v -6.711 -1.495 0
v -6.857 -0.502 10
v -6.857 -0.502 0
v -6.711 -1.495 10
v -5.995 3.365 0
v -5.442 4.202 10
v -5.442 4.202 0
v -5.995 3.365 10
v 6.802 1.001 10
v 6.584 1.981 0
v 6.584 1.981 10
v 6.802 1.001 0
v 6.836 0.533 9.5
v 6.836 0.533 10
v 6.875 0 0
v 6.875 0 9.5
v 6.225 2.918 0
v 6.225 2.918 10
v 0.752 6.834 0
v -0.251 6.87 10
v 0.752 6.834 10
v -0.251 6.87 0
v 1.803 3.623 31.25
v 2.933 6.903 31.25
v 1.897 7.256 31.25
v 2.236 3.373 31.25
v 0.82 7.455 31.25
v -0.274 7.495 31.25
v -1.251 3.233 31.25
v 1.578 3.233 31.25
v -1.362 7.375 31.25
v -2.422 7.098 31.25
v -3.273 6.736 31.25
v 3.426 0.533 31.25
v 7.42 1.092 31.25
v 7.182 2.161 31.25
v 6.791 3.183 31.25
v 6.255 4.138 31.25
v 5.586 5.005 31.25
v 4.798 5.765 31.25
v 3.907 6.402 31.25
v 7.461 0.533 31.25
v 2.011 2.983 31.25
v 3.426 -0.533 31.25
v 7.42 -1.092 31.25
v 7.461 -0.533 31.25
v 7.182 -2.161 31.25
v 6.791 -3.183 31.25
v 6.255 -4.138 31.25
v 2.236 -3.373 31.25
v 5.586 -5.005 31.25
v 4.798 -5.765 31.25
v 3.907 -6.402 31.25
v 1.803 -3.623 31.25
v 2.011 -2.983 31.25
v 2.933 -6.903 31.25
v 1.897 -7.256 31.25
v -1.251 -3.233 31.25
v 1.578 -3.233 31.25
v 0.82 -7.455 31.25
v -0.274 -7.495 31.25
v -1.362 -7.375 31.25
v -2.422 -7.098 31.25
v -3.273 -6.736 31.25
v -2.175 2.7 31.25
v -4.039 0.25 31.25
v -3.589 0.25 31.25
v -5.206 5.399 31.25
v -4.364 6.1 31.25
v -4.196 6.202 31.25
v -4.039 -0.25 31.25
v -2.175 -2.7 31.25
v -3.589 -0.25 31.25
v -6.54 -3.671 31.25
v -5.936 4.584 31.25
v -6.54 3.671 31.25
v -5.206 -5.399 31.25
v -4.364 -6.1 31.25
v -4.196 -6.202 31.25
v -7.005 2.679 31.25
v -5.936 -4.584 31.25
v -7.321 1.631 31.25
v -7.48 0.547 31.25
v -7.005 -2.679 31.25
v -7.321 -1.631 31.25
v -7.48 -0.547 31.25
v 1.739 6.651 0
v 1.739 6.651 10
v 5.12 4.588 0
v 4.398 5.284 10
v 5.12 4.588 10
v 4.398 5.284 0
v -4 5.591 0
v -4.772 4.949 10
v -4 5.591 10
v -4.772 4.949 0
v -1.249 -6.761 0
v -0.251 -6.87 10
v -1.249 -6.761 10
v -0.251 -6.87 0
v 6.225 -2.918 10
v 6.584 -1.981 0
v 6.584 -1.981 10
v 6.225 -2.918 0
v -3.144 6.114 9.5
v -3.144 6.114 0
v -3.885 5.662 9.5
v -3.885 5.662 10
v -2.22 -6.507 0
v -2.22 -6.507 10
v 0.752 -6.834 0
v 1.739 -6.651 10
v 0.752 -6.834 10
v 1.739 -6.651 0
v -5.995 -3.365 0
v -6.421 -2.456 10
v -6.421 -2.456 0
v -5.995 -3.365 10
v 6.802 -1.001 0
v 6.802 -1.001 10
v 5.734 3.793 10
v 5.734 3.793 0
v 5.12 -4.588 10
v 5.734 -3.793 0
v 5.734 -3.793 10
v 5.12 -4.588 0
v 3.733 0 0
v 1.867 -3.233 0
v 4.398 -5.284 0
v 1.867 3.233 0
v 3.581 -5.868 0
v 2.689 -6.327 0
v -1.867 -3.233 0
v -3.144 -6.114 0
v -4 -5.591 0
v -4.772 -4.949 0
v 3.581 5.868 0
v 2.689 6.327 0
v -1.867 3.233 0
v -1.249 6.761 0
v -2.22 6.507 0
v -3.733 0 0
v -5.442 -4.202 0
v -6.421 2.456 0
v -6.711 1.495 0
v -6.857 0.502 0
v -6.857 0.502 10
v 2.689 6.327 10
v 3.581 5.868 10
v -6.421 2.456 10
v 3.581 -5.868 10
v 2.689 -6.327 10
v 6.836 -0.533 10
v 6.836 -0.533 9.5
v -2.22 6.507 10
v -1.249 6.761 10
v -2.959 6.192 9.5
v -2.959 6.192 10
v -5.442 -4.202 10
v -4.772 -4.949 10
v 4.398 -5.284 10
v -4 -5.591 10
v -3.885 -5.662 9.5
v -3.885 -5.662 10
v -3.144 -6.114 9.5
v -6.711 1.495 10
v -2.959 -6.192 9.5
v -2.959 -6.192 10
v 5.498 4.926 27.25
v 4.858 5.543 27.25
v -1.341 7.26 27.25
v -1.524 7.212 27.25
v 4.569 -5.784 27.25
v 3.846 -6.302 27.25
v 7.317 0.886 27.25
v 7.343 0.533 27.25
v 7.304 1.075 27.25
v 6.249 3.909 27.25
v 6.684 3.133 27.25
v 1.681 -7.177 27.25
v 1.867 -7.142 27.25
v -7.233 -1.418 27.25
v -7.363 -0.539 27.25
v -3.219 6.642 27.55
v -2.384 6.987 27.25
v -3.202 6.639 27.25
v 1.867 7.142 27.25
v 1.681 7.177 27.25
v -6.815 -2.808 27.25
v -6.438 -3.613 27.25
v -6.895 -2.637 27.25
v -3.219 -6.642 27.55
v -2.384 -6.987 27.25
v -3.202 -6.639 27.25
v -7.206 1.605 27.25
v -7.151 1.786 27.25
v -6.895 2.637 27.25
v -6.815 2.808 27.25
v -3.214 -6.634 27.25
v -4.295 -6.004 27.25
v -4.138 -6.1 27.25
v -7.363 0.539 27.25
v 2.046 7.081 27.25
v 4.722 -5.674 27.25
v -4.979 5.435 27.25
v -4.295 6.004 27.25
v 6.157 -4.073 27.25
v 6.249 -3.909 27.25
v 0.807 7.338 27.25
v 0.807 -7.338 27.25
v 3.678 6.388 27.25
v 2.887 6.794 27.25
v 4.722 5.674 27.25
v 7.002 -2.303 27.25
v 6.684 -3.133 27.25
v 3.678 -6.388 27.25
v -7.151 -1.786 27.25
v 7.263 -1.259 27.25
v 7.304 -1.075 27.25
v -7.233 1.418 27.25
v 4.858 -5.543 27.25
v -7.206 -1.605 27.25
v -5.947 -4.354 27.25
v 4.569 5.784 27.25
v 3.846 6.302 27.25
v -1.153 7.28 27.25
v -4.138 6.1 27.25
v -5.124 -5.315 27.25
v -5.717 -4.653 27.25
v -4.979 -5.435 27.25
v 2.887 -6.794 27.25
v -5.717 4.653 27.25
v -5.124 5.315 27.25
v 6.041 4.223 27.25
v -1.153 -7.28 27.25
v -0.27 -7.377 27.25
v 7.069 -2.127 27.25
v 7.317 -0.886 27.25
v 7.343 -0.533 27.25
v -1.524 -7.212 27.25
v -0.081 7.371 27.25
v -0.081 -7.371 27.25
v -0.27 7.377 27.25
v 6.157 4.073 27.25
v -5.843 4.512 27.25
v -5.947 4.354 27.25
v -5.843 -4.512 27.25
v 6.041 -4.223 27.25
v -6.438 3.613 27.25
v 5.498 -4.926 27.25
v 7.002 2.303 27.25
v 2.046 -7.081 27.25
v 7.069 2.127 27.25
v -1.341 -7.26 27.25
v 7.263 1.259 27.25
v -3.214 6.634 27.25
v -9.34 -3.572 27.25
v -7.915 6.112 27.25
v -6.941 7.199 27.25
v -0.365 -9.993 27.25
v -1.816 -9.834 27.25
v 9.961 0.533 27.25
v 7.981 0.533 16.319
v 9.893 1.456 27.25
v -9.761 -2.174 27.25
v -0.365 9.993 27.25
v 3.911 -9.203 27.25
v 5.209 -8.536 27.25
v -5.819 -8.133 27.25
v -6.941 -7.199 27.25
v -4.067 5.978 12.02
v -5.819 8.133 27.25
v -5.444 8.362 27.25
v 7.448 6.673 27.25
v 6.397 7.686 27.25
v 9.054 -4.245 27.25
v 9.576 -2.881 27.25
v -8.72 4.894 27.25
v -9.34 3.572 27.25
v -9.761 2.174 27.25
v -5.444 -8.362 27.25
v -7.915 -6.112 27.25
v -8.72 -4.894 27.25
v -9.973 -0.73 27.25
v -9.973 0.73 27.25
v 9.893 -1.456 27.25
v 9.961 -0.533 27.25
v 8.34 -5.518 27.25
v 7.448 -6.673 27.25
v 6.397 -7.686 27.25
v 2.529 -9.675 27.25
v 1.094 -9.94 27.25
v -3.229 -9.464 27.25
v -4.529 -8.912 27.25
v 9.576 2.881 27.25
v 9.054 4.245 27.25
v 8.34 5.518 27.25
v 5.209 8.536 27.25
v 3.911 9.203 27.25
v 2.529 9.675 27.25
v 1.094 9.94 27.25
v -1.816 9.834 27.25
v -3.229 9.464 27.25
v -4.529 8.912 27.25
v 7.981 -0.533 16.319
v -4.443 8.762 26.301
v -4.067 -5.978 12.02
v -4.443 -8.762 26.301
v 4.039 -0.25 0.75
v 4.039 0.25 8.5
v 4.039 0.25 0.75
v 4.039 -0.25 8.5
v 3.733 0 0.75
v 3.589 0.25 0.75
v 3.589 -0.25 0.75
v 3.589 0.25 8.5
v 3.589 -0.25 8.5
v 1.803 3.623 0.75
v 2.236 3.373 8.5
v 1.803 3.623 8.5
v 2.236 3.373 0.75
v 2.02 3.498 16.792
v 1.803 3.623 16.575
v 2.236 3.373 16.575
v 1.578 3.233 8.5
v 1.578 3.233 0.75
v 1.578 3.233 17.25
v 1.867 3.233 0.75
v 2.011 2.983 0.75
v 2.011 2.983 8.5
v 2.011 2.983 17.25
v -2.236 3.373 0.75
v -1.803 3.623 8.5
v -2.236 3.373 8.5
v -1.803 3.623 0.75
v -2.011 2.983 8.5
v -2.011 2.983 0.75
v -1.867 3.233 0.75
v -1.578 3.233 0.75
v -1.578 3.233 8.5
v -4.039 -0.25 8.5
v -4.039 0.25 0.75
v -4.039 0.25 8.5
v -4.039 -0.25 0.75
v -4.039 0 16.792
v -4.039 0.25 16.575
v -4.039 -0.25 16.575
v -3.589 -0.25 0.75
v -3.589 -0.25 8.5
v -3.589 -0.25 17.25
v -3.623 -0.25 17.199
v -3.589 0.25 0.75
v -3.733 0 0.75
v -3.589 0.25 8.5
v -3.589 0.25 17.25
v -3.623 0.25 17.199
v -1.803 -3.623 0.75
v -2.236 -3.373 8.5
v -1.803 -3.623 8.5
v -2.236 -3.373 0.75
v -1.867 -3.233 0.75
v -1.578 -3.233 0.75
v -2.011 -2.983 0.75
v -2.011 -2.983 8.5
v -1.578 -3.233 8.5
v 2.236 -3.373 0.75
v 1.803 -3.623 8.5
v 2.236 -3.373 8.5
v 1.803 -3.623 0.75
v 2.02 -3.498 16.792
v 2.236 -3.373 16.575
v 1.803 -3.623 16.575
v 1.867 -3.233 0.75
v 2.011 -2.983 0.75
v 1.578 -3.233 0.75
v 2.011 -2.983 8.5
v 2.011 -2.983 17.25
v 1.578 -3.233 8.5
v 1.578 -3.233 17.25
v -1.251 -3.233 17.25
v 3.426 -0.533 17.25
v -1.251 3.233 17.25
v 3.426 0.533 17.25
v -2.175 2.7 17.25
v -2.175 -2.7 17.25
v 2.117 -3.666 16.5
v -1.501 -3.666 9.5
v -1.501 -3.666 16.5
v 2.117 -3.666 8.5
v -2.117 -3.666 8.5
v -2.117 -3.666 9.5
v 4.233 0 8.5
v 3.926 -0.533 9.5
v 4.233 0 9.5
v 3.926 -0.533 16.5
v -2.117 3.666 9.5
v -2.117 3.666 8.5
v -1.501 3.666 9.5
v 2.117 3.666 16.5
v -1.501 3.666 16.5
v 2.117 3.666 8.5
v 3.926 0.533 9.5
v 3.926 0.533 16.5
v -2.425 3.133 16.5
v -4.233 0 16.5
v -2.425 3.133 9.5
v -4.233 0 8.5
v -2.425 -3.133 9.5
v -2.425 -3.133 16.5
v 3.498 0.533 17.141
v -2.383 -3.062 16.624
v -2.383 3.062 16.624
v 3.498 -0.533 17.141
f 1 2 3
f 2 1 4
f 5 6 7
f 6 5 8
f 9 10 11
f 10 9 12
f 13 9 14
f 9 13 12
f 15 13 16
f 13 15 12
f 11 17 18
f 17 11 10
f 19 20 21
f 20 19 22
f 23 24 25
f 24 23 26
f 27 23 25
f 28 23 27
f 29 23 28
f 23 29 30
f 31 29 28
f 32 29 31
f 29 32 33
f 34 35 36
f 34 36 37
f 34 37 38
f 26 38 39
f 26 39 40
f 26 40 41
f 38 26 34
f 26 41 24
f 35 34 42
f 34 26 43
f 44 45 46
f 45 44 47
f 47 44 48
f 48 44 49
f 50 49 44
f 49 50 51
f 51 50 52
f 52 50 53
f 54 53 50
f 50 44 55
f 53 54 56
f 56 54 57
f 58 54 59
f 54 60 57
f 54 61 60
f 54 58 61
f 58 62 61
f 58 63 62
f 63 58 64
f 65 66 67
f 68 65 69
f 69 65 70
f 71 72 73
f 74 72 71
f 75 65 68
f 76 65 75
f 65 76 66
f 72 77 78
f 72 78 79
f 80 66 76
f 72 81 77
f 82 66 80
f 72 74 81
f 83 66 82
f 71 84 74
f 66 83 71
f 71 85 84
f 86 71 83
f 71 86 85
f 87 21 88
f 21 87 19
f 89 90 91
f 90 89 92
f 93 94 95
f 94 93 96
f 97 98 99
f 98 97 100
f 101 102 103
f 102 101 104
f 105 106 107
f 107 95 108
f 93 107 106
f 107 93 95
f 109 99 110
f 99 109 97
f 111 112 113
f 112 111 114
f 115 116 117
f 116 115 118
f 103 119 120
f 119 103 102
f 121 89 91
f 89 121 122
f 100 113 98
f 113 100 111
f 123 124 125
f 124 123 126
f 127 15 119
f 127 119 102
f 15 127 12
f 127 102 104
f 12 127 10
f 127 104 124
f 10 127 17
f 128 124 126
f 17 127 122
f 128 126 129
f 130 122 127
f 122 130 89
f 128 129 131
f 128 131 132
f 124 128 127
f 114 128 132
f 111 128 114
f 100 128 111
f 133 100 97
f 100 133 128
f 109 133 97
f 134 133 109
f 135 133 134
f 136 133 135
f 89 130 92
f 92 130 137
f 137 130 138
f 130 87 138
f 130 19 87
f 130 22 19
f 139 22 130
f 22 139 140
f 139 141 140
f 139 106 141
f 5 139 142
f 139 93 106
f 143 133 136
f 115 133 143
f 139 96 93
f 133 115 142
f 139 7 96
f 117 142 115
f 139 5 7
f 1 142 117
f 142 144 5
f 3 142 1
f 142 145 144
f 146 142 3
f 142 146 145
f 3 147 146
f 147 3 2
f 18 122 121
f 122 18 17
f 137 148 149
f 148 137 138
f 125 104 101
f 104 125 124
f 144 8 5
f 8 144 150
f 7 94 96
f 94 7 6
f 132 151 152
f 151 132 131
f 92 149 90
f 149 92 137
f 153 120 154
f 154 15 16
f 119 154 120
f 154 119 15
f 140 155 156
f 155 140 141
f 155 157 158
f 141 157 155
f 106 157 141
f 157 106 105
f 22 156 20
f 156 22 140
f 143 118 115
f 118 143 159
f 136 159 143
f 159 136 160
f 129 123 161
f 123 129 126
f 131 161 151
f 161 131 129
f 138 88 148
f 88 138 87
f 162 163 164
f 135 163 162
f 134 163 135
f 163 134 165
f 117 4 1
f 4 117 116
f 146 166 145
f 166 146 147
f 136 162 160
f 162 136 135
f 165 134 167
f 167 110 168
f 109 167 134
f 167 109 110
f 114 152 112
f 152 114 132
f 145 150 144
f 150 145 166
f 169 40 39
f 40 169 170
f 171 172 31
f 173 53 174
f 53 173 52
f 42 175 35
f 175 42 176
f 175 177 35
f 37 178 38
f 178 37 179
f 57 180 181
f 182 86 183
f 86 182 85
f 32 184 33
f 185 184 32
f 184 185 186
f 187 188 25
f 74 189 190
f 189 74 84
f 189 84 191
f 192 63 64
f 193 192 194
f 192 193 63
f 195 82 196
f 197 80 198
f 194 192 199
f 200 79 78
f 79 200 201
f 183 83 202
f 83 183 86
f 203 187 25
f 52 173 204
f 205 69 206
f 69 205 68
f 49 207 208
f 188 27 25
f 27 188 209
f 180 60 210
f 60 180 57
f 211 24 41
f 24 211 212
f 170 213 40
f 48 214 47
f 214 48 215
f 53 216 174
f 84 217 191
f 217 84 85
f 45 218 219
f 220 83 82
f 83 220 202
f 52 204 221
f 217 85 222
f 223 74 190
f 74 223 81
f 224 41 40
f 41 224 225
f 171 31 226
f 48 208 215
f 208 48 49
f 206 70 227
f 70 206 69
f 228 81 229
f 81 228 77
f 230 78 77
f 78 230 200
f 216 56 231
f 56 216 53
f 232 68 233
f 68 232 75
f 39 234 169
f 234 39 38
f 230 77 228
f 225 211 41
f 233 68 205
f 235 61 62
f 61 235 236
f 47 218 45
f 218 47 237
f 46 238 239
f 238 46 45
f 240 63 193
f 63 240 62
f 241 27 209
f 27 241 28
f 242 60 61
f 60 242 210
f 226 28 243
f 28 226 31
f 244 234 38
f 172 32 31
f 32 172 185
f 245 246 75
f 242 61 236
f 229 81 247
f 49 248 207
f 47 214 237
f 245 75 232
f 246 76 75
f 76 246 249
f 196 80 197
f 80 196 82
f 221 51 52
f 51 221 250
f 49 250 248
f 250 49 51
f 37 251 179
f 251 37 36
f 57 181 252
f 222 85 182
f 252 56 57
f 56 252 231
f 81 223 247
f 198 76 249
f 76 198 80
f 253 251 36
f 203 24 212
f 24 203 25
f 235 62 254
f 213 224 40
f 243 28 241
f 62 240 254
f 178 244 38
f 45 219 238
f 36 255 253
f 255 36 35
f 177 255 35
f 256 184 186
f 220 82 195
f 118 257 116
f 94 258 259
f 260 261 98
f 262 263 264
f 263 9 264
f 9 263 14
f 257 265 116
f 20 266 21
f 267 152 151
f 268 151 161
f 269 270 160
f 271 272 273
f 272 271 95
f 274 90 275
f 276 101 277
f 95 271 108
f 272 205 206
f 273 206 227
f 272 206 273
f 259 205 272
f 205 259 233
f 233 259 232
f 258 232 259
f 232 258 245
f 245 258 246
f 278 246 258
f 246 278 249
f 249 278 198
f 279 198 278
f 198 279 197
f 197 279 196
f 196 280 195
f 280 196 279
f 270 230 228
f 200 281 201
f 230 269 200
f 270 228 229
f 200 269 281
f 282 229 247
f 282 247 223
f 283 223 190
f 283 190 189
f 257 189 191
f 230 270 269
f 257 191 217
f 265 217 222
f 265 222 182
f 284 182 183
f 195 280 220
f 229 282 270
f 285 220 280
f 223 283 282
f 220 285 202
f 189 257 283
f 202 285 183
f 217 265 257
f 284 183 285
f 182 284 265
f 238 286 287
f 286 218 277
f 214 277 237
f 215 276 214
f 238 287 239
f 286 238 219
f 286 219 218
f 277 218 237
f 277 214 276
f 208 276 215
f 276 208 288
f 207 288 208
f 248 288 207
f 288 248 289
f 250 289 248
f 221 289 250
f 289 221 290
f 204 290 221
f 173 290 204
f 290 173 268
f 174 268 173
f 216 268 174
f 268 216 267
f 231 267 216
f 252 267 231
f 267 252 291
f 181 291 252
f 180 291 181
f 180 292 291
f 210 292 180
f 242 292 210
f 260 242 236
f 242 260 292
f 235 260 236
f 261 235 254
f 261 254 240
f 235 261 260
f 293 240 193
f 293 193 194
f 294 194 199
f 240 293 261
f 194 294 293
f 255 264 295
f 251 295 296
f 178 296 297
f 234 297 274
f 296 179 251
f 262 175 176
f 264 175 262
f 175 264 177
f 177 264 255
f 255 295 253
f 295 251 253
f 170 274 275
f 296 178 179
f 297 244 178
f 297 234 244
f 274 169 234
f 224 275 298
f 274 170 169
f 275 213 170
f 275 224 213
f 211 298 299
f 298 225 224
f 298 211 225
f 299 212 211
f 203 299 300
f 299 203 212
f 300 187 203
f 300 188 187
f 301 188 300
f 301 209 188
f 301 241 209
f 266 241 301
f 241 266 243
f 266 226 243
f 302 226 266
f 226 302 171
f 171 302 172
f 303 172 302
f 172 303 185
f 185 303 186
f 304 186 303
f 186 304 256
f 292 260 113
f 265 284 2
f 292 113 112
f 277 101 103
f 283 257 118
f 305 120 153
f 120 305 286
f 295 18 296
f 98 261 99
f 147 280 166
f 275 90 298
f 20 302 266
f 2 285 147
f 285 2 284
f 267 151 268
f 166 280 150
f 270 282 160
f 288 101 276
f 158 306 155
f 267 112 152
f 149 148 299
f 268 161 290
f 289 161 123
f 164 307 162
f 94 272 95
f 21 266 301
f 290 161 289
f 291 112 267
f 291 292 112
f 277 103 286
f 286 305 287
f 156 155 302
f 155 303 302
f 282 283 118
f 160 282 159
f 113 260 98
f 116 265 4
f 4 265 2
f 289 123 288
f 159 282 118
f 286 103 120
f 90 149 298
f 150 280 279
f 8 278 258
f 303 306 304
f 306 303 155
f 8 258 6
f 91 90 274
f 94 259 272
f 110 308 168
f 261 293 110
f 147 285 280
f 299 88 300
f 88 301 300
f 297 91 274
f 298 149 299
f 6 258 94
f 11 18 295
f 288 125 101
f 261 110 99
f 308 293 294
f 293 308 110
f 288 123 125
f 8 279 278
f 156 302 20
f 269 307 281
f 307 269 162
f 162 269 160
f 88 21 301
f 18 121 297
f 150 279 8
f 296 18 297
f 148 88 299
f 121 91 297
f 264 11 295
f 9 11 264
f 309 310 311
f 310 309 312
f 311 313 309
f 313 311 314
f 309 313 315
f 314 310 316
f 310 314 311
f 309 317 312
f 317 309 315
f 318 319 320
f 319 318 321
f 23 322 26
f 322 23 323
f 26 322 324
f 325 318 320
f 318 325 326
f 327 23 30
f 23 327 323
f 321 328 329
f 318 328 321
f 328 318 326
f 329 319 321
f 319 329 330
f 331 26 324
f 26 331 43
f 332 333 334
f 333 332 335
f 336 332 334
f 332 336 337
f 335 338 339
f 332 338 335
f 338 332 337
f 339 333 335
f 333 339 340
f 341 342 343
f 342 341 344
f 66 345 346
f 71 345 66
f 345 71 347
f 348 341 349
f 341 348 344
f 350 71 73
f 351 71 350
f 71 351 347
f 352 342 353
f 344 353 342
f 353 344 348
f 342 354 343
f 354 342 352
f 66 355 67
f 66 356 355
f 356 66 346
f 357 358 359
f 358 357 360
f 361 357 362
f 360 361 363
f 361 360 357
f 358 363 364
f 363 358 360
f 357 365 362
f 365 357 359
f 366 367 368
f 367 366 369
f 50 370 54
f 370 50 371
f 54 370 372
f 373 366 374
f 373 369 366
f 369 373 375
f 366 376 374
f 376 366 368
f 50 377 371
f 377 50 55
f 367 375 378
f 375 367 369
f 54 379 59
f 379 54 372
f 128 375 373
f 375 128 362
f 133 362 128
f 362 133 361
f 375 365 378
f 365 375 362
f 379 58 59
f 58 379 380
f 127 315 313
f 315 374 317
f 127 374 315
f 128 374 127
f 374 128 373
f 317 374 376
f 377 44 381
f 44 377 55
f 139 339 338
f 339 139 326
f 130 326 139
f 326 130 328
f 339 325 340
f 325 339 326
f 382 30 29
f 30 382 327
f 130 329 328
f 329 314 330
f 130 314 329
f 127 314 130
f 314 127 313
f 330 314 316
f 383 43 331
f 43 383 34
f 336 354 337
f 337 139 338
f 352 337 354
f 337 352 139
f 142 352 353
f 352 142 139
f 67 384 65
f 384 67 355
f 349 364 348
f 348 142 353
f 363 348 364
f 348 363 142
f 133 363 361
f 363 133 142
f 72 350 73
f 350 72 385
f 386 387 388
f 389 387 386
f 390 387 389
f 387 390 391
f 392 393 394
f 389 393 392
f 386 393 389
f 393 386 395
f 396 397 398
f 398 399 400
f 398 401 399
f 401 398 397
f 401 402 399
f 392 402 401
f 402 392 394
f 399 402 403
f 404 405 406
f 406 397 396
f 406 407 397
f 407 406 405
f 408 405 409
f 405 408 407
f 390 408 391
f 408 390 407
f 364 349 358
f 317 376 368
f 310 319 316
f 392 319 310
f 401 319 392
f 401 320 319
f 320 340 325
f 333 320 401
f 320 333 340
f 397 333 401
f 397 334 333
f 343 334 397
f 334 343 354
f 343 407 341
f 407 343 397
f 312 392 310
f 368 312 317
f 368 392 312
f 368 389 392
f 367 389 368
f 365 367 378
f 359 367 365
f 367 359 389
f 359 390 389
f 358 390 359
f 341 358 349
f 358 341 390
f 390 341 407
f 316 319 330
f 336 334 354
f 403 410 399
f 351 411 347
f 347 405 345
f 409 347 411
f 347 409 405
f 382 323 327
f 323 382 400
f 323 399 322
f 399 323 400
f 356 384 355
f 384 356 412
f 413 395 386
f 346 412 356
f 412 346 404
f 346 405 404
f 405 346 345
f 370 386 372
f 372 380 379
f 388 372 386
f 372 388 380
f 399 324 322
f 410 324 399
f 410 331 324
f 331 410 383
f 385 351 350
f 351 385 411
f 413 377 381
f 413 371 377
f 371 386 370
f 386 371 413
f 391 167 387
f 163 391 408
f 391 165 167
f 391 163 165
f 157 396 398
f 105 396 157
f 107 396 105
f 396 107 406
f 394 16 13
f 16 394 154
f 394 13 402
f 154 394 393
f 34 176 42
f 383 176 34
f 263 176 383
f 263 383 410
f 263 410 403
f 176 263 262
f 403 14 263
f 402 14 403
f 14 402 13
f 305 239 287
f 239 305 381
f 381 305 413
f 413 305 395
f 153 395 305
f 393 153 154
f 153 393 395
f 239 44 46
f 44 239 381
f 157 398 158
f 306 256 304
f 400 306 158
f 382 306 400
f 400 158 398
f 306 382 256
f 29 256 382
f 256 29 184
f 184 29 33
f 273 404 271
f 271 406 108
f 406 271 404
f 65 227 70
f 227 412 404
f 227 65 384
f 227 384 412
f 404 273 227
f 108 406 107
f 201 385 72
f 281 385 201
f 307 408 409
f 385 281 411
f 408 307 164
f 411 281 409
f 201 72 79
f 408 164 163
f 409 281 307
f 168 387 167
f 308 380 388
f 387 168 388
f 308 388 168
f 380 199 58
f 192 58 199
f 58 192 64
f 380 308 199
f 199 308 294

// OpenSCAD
/*
 * collets4tapHolder.scad
 * 
 * Written by aubenc @ Thingiverse
 *
 * http://www.thingiverse.com/thing:16956
 *
 * This script is licensed under the
 * Attribution - Share Alike license
 *
 * This is a derivative work of "Tap holder" by Rasle500
 *
 *		http://www.thingiverse.com/thing:16682
 *
 * ...and the derivatives of that work:
 *
 *		http://www.thingiverse.com/thing:16839
 *		http://www.thingiverse.com/thing:16890
 *
 * Usage:
 *
 *    Set the parameters for the desired output, run the required module(s),
 *		render to check, compile and export to STL when/if satisfied.
 *
 */


/* *************** Parameters *********************************************** */

typ="H";		// "C" - Cylindrical, Drill Bit / "H" - Hex, Accessoire


// Parameters for type "C"

dbd=3.2;		// Drill Bit Diameter


// Parameters for type "H"

f2f=6.25;	// Distance between opposite faces
ffn=6;		// Faces number, should NOT work for any value but 6 (hex)
fop="V";		// opening at... "V" - Vertex / "F" - Face
fvs=0.5;		// Side length of the cube used to exagerate the cut for the vertex


// Common Parameters

gap=0.25;	// ...gap ...tolerance ... ... ...
ono=3;		// Number of openings, cuts, clamps, whatever
omn=0.5;		// Minimum size to keep it open (avoid the walls fusing together)


/* *************** Modules ************************************************** */

 collet(typ); 


/* *************** Code ***************************************************** */

module collet(typ)
{
	difference()
	{
		body();

		if( typ == "C" )
		{
			drill_bit();
			openings();
		}
		else if( typ == "H" )
		{
			union()
			{
				accessoire_bit();

				if( fop == "V" )
				{
					openings();
				}
				else if ( fop == "F" )
				{
					rotate([0,0,360/ffn/2]) openings();
				}
			}
		}
	}
}

module body()
{
	union()
	{
		cylinder(h=31.25, r=13.75/2, $fn=13.75*PI, center=false);

		translate([0,0,10])
		cylinder(h=31.25-10, r1=13.75/2, r2=15/2, $fn=13.75*PI, center=false);

		translate([0,0,10])
		cylinder(h=31.25-10-4, r1=13.75/2, r2=20/2, $fn=13.75*PI, center=false);
	}
}

module drill_bit()
{
   cfn=ono*round(dbd*PI/ono);

	union()
	{
		translate([0,0,-0.1])
		cylinder(h=10+0.2, r=(dbd-gap)/2, $fn=cfn, center=false);

		translate([0,0,7])
		cylinder(h=31.25-7+0.2, r=(dbd+gap)/2, $fn=cfn, center=false);

		translate([0,0,8.5])
		cylinder(h=8, r=(dbd+gap+1)/2, $fn=cfn, center=false);

		translate([0,0,8.5+8])
		cylinder(h=0.75, r1=(dbd+gap+1)/2, r2=(dbd+gap)/2, $fn=cfn, center=false);
	}
}

module openings()
{

	oy=dbd/ono > omn ? dbd/ono : omn;

	translate([0,0,9.5])
	for(i=[0:ono-1])
	{
		rotate([0,0,i*360/ono])
		translate([6,0,31.25/2])
		cube(size=[12,oy,31.25], center=true);
	}
}

module accessoire_bit()
{
	lf=360/ffn;
	fod=f2f/sin(lf);

	union()
	{
		translate([0,0,-0.1])
		cylinder(h=31.25+0.2, r=(fod+gap)/2, $fn=ffn, center=false);

		translate([0,0,8.5])
		cylinder(h=8, r=(fod+gap+1)/2, $fn=ffn, center=false);

		translate([0,0,8.5+8])
		cylinder(h=0.75, r1=(fod+gap+1)/2, r2=(fod+gap)/2, $fn=ffn, center=false);

		if( fvs != 0 )
		assign(xd=(fod+gap+fvs)/2-(fvs*cos(lf)/2/sin(lf))-0.05)
		{
			for(i=[0:ffn-1])
			assign(x=xd*cos(i*lf), y=xd*sin(i*lf))
			{
				translate([x,y,31.25/2+0.75])
				rotate([0,0,i*lf])
				cube([fvs,fvs,31.25], center=true);
			}
		}
	}
}
